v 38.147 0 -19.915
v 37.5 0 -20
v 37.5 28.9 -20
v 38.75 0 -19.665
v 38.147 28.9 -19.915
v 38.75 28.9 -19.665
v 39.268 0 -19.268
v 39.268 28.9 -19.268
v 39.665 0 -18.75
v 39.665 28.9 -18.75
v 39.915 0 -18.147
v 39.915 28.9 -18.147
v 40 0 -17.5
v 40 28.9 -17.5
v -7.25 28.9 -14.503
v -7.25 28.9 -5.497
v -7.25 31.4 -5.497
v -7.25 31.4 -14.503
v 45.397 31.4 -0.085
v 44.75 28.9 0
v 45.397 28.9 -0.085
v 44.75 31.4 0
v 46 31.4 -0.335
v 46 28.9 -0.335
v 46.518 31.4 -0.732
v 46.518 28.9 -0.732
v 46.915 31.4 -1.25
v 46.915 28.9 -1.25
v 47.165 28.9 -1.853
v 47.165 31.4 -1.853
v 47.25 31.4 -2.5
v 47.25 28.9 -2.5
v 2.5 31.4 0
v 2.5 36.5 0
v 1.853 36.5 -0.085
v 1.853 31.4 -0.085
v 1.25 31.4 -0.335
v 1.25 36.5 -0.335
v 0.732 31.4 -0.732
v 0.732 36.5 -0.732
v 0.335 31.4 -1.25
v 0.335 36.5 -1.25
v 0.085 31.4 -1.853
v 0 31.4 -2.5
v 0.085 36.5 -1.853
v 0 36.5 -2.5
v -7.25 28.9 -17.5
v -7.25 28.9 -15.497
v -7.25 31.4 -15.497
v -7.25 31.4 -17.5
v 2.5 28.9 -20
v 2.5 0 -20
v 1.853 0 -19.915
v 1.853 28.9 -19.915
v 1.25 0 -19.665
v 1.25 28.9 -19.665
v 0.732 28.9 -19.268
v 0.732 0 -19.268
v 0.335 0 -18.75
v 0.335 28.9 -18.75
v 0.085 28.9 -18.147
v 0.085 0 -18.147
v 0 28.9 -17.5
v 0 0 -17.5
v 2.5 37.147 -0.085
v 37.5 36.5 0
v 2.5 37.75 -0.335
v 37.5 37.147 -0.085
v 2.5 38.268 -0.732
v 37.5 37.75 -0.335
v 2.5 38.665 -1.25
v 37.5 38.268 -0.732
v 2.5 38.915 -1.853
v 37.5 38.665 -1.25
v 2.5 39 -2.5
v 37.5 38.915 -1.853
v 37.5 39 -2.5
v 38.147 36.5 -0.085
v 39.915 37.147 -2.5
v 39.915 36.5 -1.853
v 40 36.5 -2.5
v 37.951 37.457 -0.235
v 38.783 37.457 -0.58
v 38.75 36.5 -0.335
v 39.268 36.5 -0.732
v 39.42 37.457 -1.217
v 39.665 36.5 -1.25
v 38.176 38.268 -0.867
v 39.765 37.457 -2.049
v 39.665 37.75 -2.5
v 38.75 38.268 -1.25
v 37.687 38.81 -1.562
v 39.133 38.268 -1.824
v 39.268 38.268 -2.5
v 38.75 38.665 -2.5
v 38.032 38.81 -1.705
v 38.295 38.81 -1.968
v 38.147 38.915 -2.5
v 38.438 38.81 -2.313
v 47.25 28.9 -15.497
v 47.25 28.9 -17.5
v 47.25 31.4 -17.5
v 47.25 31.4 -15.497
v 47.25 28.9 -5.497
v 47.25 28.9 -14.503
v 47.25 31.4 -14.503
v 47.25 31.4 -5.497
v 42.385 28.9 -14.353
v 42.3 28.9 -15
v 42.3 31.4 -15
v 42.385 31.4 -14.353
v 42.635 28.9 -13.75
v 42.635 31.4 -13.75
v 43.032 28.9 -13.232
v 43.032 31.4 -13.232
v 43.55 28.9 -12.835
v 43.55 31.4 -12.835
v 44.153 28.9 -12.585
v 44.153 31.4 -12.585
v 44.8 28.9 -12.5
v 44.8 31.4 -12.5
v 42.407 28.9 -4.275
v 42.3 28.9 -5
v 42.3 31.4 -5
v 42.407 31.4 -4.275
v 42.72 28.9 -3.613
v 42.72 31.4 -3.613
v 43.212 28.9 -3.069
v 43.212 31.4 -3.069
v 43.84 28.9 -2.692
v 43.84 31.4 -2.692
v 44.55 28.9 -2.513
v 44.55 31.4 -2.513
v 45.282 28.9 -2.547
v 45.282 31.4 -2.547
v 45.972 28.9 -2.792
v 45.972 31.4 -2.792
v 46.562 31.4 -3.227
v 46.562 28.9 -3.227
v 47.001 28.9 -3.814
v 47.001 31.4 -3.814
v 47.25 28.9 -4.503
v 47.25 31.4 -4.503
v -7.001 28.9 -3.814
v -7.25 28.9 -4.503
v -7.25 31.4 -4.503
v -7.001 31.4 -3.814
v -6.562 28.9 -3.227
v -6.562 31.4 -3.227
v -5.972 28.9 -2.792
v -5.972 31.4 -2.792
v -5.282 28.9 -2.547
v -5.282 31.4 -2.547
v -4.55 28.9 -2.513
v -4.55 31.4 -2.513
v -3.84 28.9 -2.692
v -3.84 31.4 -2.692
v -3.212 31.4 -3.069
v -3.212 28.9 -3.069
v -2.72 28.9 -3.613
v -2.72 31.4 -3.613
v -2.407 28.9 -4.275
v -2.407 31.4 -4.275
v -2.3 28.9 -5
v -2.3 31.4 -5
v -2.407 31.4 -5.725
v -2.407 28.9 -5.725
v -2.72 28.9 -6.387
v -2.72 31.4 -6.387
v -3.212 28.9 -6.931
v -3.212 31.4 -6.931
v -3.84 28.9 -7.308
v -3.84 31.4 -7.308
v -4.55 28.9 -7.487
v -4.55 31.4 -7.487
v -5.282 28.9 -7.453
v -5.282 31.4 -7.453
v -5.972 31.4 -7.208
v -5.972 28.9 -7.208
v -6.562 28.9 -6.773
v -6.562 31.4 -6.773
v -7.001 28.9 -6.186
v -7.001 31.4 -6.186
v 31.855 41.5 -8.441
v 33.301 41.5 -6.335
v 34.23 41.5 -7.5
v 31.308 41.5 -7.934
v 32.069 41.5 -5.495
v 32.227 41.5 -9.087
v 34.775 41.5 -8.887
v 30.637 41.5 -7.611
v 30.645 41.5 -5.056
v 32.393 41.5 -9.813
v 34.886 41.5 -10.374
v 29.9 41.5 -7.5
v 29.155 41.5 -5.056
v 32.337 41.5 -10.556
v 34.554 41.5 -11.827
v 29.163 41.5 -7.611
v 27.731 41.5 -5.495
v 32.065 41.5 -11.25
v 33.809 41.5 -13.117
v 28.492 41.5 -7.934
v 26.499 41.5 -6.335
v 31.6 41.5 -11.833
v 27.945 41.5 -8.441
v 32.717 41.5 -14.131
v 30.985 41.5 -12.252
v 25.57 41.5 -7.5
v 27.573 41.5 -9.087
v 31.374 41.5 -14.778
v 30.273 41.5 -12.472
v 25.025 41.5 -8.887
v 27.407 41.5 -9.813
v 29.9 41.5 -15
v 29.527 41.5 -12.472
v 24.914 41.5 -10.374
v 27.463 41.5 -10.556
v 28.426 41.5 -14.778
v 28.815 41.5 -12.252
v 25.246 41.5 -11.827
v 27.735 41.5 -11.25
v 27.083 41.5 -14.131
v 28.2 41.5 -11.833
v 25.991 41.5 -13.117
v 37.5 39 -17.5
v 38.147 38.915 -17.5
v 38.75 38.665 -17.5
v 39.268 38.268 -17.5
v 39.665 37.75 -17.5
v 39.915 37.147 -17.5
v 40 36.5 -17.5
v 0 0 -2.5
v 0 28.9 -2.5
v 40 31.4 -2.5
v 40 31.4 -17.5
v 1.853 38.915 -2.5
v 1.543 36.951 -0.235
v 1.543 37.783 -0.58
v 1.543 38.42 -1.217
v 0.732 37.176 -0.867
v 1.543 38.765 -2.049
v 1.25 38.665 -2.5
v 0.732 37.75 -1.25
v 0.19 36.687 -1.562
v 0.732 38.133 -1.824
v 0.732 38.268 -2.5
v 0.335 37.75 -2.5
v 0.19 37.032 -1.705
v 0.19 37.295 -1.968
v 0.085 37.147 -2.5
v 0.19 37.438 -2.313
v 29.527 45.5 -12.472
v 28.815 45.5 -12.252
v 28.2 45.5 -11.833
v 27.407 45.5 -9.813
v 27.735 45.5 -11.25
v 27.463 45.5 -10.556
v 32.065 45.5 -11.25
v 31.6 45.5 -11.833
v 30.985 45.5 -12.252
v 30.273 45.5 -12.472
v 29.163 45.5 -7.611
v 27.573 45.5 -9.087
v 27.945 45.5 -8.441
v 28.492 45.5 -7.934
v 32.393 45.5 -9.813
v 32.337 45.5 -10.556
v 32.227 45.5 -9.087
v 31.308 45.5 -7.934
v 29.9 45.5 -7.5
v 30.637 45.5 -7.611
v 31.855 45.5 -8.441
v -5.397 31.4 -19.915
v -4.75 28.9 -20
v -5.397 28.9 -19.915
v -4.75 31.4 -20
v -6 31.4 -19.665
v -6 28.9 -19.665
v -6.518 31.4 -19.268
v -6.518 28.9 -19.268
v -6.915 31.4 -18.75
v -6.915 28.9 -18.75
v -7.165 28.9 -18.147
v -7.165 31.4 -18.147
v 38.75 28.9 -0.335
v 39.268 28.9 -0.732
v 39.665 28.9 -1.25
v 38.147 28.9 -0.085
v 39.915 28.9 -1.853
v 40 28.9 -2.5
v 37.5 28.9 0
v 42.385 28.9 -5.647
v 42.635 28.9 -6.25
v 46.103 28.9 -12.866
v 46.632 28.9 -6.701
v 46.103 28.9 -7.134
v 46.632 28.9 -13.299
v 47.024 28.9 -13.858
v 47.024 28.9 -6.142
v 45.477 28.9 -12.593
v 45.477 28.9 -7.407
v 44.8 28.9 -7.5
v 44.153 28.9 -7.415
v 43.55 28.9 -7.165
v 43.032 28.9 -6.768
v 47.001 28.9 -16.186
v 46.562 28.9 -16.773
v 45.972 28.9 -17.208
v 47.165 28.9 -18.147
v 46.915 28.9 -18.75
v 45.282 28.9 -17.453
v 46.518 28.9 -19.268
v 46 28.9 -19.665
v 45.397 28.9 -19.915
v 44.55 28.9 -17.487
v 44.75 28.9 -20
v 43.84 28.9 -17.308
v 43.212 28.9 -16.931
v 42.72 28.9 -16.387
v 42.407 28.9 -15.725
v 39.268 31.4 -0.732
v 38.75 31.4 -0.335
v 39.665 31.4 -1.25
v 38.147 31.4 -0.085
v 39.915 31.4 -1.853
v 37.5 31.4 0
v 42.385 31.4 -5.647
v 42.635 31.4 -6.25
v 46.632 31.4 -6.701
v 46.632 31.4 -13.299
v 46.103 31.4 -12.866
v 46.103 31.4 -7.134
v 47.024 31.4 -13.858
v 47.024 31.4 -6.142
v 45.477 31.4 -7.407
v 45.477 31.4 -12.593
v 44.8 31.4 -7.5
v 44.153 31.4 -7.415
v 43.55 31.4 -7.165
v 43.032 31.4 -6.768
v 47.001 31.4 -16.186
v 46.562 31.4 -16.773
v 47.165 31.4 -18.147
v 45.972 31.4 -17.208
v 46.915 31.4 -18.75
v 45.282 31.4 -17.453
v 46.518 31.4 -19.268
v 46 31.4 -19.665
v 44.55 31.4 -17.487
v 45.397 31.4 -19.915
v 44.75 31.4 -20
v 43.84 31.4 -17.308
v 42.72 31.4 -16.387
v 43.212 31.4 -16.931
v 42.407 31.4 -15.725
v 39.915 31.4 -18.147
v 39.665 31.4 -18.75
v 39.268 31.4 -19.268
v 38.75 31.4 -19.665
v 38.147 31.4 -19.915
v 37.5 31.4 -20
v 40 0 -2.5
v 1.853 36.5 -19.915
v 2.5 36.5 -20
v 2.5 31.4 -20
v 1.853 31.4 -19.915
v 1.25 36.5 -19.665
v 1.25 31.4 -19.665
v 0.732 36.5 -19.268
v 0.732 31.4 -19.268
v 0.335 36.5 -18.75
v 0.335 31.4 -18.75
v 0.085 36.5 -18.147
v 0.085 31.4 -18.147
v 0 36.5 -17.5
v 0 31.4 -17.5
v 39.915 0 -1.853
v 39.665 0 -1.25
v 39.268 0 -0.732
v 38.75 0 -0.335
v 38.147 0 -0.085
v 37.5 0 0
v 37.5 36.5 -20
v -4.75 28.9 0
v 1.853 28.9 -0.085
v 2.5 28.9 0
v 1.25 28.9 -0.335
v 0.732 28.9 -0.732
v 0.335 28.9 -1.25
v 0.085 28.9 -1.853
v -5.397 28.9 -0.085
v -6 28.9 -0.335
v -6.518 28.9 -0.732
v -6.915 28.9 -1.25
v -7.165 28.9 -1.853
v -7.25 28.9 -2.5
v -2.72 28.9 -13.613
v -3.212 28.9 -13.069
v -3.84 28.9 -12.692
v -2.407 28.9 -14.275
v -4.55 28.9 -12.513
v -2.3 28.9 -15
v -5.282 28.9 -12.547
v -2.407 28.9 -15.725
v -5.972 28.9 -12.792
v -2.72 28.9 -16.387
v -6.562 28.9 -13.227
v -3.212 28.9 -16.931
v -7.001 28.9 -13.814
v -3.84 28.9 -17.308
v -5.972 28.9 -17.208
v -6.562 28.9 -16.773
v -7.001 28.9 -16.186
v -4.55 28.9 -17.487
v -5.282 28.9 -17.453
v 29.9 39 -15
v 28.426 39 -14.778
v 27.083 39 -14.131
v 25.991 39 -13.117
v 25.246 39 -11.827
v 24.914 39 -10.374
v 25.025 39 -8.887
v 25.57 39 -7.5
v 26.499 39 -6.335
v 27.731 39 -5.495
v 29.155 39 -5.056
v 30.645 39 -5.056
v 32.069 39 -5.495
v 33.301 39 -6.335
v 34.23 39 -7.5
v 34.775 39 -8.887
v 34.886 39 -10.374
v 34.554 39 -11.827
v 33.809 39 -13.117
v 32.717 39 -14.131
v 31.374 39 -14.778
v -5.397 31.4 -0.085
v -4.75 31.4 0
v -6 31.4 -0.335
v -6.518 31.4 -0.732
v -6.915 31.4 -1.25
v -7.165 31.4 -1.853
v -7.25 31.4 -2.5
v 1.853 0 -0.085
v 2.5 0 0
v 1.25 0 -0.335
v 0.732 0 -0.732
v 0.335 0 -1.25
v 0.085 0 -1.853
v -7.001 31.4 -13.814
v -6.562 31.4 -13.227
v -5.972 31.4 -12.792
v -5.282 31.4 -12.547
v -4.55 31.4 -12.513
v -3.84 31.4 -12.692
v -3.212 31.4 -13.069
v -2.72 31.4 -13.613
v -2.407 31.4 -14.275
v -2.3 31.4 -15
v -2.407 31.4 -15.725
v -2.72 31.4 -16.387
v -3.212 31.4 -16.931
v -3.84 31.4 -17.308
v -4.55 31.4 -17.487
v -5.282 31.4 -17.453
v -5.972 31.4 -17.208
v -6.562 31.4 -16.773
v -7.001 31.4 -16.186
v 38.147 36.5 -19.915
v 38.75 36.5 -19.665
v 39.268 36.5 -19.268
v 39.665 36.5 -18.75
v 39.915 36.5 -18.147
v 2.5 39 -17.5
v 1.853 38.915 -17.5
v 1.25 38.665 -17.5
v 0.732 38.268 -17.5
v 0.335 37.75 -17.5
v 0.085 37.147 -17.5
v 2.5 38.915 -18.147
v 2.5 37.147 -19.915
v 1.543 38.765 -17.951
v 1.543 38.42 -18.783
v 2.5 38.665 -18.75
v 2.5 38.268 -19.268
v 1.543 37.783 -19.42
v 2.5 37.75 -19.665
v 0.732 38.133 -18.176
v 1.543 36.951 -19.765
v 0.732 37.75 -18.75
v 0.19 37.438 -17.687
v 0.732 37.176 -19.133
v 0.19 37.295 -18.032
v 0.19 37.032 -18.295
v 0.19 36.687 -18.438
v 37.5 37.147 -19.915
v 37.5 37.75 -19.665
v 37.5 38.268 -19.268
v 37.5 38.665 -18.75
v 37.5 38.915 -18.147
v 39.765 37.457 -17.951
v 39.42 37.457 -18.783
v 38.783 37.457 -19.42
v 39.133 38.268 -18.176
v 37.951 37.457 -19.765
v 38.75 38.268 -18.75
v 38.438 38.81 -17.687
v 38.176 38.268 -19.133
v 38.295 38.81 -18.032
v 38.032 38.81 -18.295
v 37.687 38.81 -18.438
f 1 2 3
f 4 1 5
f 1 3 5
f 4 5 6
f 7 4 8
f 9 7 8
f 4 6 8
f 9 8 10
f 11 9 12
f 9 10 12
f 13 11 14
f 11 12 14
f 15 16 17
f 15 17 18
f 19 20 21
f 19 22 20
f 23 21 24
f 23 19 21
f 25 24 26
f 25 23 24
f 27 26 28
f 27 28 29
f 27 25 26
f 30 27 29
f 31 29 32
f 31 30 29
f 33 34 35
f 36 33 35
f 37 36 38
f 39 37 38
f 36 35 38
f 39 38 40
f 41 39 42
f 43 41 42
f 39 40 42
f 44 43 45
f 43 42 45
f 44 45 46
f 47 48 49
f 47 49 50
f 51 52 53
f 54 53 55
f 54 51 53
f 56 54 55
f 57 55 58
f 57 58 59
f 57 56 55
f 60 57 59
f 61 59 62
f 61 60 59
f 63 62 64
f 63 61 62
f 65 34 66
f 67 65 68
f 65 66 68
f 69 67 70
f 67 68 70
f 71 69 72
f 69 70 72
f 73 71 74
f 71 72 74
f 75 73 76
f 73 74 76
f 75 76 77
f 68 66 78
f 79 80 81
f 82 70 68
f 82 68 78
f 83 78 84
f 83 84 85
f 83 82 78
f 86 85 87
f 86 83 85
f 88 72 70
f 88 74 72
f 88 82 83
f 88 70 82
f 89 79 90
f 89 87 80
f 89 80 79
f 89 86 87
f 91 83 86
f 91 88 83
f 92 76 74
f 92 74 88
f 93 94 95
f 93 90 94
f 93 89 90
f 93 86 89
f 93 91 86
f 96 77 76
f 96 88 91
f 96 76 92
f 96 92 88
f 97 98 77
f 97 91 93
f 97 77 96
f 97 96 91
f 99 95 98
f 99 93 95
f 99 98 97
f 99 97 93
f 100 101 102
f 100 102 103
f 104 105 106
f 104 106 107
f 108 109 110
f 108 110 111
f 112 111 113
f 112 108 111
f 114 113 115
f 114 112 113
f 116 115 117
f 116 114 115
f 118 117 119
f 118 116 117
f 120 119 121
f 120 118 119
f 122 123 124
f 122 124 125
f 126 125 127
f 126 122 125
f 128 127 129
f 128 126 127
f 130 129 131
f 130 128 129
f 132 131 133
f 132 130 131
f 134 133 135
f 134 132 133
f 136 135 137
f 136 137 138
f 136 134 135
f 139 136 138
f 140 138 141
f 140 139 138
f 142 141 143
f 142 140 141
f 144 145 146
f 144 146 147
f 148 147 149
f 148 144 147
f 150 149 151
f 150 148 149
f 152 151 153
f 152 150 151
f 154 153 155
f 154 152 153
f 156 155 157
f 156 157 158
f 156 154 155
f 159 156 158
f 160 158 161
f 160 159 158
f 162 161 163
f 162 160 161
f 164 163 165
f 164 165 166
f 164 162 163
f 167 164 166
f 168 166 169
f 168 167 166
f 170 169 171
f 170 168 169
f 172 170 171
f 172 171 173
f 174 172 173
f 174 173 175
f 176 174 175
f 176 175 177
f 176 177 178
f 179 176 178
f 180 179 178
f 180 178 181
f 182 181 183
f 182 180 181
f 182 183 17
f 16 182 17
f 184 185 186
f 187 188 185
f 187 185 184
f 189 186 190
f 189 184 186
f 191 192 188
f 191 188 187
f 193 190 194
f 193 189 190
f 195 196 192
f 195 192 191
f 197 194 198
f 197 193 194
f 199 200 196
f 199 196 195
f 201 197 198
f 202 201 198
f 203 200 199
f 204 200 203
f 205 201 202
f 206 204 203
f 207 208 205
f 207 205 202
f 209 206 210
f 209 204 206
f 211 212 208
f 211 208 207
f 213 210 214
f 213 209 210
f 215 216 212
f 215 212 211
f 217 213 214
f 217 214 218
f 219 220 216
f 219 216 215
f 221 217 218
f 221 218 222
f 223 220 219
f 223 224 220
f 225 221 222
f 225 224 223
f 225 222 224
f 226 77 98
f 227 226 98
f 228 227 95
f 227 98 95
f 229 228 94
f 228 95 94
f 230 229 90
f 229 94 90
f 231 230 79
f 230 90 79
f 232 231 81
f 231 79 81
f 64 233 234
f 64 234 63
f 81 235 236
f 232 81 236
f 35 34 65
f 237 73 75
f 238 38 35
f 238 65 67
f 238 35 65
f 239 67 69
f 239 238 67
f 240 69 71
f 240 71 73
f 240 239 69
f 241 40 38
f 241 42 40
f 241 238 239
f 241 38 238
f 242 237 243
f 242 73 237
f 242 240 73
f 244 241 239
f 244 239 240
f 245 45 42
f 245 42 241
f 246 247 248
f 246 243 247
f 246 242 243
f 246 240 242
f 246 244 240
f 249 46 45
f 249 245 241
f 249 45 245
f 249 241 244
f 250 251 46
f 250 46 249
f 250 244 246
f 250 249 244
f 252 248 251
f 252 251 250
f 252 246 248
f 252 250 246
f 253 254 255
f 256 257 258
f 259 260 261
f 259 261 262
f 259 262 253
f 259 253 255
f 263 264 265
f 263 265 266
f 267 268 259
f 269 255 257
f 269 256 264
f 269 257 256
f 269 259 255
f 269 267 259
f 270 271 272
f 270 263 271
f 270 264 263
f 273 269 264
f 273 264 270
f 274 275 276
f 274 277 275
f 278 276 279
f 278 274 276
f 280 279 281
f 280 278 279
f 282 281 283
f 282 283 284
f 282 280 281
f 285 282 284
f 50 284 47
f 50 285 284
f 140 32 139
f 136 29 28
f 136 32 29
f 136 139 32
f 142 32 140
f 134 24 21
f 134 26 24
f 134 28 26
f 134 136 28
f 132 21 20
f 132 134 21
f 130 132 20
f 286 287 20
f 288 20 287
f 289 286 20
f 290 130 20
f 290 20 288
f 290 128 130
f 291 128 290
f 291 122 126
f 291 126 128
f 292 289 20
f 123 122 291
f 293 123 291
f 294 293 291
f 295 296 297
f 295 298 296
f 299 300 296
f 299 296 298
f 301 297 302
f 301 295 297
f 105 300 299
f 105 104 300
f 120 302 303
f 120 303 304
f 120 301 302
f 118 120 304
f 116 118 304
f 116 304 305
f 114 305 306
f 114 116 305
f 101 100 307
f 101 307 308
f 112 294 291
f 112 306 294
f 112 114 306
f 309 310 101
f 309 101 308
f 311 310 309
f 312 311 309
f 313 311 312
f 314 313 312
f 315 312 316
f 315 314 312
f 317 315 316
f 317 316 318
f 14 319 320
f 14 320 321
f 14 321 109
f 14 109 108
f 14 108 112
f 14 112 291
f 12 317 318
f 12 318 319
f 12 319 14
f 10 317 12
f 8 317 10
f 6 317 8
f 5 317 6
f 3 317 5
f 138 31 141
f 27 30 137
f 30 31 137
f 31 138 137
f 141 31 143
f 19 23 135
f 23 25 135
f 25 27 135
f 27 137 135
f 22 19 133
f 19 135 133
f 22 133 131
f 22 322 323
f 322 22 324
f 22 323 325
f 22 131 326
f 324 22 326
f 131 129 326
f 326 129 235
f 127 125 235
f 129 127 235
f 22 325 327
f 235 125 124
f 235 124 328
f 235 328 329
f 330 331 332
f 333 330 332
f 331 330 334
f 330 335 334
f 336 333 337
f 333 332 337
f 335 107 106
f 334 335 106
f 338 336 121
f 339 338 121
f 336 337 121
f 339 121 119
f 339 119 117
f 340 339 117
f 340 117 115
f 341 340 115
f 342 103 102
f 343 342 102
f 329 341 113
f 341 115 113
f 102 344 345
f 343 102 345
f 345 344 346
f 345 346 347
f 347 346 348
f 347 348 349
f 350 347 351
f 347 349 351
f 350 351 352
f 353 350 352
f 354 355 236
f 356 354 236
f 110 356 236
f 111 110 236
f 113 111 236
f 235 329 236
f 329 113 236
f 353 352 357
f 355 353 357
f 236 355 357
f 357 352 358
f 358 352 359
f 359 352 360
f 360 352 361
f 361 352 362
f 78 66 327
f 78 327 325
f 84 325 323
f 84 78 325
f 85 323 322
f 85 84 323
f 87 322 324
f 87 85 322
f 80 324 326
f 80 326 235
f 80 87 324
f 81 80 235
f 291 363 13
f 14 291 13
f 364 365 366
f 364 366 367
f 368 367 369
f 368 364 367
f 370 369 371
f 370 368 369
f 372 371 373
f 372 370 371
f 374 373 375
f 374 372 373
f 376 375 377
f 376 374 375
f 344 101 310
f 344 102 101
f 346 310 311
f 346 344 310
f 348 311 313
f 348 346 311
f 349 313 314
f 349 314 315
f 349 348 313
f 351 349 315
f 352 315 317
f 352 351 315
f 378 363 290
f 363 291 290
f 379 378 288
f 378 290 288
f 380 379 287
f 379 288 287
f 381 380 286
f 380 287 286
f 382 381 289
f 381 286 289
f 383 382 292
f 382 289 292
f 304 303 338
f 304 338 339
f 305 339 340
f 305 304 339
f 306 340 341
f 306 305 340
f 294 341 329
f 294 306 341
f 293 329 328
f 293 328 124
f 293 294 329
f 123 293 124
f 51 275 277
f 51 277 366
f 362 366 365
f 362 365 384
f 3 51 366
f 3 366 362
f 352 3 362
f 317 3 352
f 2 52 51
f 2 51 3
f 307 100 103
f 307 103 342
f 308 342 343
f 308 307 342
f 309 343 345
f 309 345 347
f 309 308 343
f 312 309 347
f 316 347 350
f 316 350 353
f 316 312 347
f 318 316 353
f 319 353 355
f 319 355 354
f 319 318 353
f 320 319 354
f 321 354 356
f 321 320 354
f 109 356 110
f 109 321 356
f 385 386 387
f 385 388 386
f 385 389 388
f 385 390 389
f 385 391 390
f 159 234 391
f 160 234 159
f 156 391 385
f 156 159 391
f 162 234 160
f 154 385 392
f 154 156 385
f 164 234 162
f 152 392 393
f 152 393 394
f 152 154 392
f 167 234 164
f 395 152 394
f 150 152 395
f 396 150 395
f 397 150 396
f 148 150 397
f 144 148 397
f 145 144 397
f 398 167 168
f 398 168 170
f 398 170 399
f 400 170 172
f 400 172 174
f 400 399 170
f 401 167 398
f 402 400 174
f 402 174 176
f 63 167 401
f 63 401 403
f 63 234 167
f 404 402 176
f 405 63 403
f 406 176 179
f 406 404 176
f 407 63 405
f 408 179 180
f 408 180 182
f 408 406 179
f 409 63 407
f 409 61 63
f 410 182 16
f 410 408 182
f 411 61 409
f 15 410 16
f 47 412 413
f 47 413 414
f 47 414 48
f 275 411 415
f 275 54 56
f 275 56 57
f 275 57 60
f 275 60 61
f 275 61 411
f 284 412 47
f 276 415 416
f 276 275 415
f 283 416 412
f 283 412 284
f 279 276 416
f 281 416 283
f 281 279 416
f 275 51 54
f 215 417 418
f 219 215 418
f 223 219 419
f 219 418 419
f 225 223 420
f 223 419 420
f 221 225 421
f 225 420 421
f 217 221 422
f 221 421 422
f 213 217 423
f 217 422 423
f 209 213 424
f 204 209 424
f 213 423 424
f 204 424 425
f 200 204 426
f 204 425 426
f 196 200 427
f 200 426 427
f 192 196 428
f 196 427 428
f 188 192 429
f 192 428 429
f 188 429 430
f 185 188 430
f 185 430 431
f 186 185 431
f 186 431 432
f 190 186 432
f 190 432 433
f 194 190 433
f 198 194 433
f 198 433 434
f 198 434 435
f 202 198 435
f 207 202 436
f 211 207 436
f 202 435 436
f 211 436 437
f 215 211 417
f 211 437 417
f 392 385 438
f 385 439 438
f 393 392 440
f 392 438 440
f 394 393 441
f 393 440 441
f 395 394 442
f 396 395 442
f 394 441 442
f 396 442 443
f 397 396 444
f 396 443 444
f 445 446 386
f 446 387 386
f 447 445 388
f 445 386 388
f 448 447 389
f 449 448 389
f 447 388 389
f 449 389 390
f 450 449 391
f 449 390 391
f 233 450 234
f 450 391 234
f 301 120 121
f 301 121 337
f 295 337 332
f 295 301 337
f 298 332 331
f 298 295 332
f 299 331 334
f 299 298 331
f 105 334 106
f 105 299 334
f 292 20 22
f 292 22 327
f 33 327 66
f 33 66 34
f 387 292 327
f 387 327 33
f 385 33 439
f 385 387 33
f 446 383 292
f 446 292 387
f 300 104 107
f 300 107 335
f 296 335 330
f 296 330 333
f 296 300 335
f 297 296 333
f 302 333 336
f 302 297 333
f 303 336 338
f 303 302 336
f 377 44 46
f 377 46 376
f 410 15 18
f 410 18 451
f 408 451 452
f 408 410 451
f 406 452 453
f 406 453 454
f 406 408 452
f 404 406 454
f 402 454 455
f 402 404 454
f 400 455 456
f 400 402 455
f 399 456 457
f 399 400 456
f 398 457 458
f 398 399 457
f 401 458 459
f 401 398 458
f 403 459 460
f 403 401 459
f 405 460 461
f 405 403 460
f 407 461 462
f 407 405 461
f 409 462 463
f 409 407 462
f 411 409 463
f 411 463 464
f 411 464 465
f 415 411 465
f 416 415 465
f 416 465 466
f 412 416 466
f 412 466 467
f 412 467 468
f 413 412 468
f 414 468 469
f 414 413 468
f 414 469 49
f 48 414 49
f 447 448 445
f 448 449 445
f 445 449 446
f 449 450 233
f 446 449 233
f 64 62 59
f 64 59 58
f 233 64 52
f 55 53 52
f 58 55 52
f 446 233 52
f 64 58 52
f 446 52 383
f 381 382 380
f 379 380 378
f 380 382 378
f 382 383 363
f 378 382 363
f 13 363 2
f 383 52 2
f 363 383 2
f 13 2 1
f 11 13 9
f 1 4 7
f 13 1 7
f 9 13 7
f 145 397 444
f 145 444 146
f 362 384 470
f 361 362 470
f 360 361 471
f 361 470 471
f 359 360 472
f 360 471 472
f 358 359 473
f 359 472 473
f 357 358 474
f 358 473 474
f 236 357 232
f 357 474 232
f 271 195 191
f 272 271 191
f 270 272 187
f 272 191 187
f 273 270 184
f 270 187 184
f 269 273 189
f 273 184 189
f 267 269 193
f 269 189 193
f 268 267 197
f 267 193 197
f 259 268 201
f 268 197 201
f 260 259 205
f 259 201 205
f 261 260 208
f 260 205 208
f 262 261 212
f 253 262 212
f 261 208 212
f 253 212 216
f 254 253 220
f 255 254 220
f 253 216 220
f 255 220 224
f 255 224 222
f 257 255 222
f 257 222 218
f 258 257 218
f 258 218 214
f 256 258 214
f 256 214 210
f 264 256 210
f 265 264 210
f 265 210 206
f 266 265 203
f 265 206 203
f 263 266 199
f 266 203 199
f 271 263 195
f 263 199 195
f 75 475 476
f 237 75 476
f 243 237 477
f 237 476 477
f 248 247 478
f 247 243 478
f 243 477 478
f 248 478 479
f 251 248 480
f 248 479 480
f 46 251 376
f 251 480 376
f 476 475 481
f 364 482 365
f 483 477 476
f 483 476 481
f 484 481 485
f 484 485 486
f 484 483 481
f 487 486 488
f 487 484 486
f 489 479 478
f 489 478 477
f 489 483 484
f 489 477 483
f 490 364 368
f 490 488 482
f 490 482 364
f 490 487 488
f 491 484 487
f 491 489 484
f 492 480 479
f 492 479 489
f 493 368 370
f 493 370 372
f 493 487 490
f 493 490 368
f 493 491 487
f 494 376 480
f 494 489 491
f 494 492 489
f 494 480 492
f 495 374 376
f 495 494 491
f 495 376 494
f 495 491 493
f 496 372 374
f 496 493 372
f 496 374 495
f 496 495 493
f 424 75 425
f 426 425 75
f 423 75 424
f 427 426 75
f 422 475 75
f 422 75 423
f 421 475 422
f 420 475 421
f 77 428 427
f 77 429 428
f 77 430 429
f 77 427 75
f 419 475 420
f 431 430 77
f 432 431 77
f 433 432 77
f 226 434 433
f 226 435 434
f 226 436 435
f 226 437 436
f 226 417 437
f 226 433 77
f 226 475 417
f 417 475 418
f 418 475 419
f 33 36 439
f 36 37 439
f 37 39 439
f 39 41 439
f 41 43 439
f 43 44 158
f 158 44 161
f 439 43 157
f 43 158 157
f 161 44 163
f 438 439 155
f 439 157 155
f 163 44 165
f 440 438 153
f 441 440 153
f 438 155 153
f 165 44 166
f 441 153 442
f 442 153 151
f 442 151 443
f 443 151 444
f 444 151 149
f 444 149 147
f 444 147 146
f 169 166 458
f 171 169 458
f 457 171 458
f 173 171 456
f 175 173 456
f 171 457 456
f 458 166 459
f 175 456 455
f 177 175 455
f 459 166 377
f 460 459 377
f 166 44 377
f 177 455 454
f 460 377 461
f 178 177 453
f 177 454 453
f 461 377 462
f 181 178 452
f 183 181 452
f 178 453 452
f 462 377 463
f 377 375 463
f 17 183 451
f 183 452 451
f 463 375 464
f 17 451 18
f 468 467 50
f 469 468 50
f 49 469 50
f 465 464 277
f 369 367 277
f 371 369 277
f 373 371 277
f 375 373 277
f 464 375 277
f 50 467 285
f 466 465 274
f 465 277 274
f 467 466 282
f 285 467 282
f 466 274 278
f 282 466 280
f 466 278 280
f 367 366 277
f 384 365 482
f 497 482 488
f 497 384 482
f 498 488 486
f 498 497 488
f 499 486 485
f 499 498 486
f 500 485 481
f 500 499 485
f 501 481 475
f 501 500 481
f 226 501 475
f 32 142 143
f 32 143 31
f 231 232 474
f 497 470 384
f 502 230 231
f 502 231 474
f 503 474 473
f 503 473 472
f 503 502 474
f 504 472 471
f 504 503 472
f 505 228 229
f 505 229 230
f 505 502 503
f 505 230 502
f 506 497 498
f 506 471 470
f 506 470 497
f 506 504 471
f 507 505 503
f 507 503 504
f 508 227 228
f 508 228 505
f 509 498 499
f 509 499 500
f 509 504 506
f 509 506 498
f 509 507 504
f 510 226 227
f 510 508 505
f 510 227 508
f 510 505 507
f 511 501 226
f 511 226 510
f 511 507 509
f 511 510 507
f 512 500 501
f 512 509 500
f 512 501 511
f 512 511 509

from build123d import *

# Parameters (mm, degrees)
SKETCH1_W           = 40
SKETCH1_H           = 20
BOSS_EXTRUDE1_DEPTH = 39
BOSS_EXTRUDE2_DEPTH = 2.5
FILLET1_R           = 2.5
SKETCH3_R           = 5
BOSS_EXTRUDE3_DEPTH = 2.5
SKETCH4_R           = 2.5
BOSS_EXTRUDE4_DEPTH = 4
FILLET2_R           = 2.5
FILLET3_R           = 2.5


with BuildPart() as part:
    # Sketch1 → Boss-Extrude1 (new body)
    with BuildSketch(Plane(origin=(0, 0, 0), x_dir=(1, 0, 0), z_dir=(0, 1, 0))):
        with Locations((20, 10)):
            Rectangle(SKETCH1_W, SKETCH1_H)
    extrude(amount=BOSS_EXTRUDE1_DEPTH)

    # Sketch2 → Boss-Extrude2 (add)
    with BuildSketch(Plane(origin=(0, 28.9, 0), x_dir=(-1, 0, 0), z_dir=(0, -1, 0))):
        with BuildLine():
            ThreePointArc((-44.8, 12.5), (-46.382129215, 13.064317395), (-47.25, 14.502506281))
            Line((-47.25, 14.502506281), (-47.25, 5.497493719))
            ThreePointArc((-47.25, 5.497493719), (-46.382129215, 6.935682605), (-44.8, 7.5))
            Line((-44.8, 7.5), (-44.8, 12.5))
        make_face()
        with BuildLine():
            Line((7.25, 20), (-47.25, 20))
            Line((-47.25, 20), (-47.25, 15.497493719))
            ThreePointArc((-47.25, 15.497493719), (-44.55, 17.487468593), (-42.3, 15))
            ThreePointArc((-42.3, 15), (-43.032233047, 13.232233047), (-44.8, 12.5))
            Line((-44.8, 12.5), (-44.8, 7.5))
            ThreePointArc((-44.8, 7.5), (-43.032233047, 6.767766953), (-42.3, 5))
            ThreePointArc((-42.3, 5), (-44.55, 2.512531407), (-47.25, 4.502506281))
            Line((-47.25, 4.502506281), (-47.25, 0))
            Line((-47.25, 0), (7.25, 0))
            Line((7.25, 0), (7.25, 4.502506281))
            ThreePointArc((7.25, 4.502506281), (2.3, 5), (7.25, 5.497493719))
            Line((7.25, 5.497493719), (7.25, 14.502506281))
            ThreePointArc((7.25, 14.502506281), (2.3, 15), (7.25, 15.497493719))
            Line((7.25, 15.497493719), (7.25, 20))
        make_face()
    extrude(amount=-BOSS_EXTRUDE2_DEPTH)

    # Fillet1
    fillet1_edges = [part.edges().sort_by_distance(p)[0] for p in [
        (47.25, 30.15, -20),
        (-7.25, 30.15, 0),
        (-7.25, 30.15, -20),
        (47.25, 30.15, 0),
    ]]
    fillet(fillet1_edges, radius=FILLET1_R)

    # Sketch3 → Boss-Extrude3 (add)
    with BuildSketch(Plane(origin=(0, 39, 0), x_dir=(1, 0, 0), z_dir=(0, 1, 0))):
        with Locations(Location((29.9, 10, 0), (0, 0, 90))):
            Circle(SKETCH3_R)
    extrude(amount=BOSS_EXTRUDE3_DEPTH)

    # Sketch4 → Boss-Extrude4 (add)
    with BuildSketch(Plane(origin=(0, 41.5, 0), x_dir=(1, 0, 0), z_dir=(0, 1, 0))):
        with Locations(Location((29.9, 10, 0), (0, 0, 270))):
            Circle(SKETCH4_R)
    extrude(amount=BOSS_EXTRUDE4_DEPTH)

    # Fillet2
    fillet2_edges = [part.edges().sort_by_distance(p)[0] for p in [
        (0, 14.45, -20),
        (40, 14.45, -20),
        (40, 14.45, 0),
        (20, 39, -20),
        (0, 14.45, 0),
        (0, 35.2, -20),
        (40, 35.2, -20),
        (40, 35.2, 0),
        (0, 35.2, 0),
        (20, 39, 0),
    ]]
    fillet(fillet2_edges, radius=FILLET2_R)

    # Fillet3
    # the kernel refuses this fillet: 2.5 mm, written as the material it takes off along each edge
    with BuildSketch(Plane(origin=(2.5, 36.5, -2.5), x_dir=(0, 1, 0), z_dir=(-1, 0, 0))) as fillet3_piece_1_section:
        Polygon((0, 0), (FILLET3_R, 0), (FILLET3_R, -FILLET3_R), (0, -FILLET3_R), align=None)
    fillet3_piece_1 = extrude(amount=FILLET3_R, mode=Mode.PRIVATE)
    fillet3_piece_1 = fillet3_piece_1 - Plane(origin=(2.5, 36.5, -2.5), x_dir=(0, -0.7071067811865475, -0.7071067811865475), z_dir=(-1, 0, 0)) * Sphere(FILLET3_R, mode=Mode.PRIVATE)
    add(fillet3_piece_1, mode=Mode.SUBTRACT)
    with BuildSketch(Plane(origin=(37.5, 36.5, -2.5), x_dir=(1, 0, 0), z_dir=(0, 1, 0))) as fillet3_piece_2_section:
        Polygon((0, 0), (FILLET3_R, 0), (FILLET3_R, -FILLET3_R), (0, -FILLET3_R), align=None)
    fillet3_piece_2 = extrude(amount=FILLET3_R, mode=Mode.PRIVATE)
    fillet3_piece_2 = fillet3_piece_2 - Plane(origin=(37.5, 36.5, -2.5), x_dir=(-0.7071067811865475, 0, -0.7071067811865475), z_dir=(0, 1, 0)) * Sphere(FILLET3_R, mode=Mode.PRIVATE)
    add(fillet3_piece_2, mode=Mode.SUBTRACT)
    with BuildSketch(Plane(origin=(37.5, 36.5, -17.5), x_dir=(1, 0, 0), z_dir=(0, 1, 0))) as fillet3_piece_3_section:
        Polygon((0, 0), (FILLET3_R, 0), (FILLET3_R, FILLET3_R), (0, FILLET3_R), align=None)
    fillet3_piece_3 = extrude(amount=FILLET3_R, mode=Mode.PRIVATE)
    fillet3_piece_3 = fillet3_piece_3 - Plane(origin=(37.5, 36.5, -17.5), x_dir=(-0.7071067811865475, 0, 0.7071067811865475), z_dir=(0, 1, 0)) * Sphere(FILLET3_R, mode=Mode.PRIVATE)
    add(fillet3_piece_3, mode=Mode.SUBTRACT)
    with BuildSketch(Plane(origin=(2.5, 36.5, -17.5), x_dir=(0, 1, 0), z_dir=(-1, 0, 0))) as fillet3_piece_4_section:
        Polygon((0, 0), (FILLET3_R, 0), (FILLET3_R, FILLET3_R), (0, FILLET3_R), align=None)
    fillet3_piece_4 = extrude(amount=FILLET3_R, mode=Mode.PRIVATE)
    fillet3_piece_4 = fillet3_piece_4 - Plane(origin=(2.5, 36.5, -17.5), x_dir=(0, -0.7071067811865475, 0.7071067811865475), z_dir=(-1, 0, 0)) * Sphere(FILLET3_R, mode=Mode.PRIVATE)
    add(fillet3_piece_4, mode=Mode.SUBTRACT)
    with BuildSketch(Plane(origin=(0, 39, -17.5), x_dir=(0, -1, 0), z_dir=(0, 0, 1))) as fillet3_piece_5:
        with BuildLine():
            CenterArc((FILLET3_R, FILLET3_R), FILLET3_R, 180, 90)
            Line((0, FILLET3_R), (0, 0))
            Line((0, 0), (FILLET3_R, 0))
        make_face()
    extrude(amount=15, mode=Mode.SUBTRACT)
    with BuildSketch(Plane(origin=(40, 39, -2.5), x_dir=(-1, 0, 0), z_dir=(0, 0, -1))) as fillet3_piece_6:
        with BuildLine():
            CenterArc((FILLET3_R, -FILLET3_R), FILLET3_R, 90, 90)
            Line((0, -FILLET3_R), (0, 0))
            Line((0, 0), (FILLET3_R, 0))
        make_face()
    extrude(amount=15, mode=Mode.SUBTRACT)


solid = part.part
